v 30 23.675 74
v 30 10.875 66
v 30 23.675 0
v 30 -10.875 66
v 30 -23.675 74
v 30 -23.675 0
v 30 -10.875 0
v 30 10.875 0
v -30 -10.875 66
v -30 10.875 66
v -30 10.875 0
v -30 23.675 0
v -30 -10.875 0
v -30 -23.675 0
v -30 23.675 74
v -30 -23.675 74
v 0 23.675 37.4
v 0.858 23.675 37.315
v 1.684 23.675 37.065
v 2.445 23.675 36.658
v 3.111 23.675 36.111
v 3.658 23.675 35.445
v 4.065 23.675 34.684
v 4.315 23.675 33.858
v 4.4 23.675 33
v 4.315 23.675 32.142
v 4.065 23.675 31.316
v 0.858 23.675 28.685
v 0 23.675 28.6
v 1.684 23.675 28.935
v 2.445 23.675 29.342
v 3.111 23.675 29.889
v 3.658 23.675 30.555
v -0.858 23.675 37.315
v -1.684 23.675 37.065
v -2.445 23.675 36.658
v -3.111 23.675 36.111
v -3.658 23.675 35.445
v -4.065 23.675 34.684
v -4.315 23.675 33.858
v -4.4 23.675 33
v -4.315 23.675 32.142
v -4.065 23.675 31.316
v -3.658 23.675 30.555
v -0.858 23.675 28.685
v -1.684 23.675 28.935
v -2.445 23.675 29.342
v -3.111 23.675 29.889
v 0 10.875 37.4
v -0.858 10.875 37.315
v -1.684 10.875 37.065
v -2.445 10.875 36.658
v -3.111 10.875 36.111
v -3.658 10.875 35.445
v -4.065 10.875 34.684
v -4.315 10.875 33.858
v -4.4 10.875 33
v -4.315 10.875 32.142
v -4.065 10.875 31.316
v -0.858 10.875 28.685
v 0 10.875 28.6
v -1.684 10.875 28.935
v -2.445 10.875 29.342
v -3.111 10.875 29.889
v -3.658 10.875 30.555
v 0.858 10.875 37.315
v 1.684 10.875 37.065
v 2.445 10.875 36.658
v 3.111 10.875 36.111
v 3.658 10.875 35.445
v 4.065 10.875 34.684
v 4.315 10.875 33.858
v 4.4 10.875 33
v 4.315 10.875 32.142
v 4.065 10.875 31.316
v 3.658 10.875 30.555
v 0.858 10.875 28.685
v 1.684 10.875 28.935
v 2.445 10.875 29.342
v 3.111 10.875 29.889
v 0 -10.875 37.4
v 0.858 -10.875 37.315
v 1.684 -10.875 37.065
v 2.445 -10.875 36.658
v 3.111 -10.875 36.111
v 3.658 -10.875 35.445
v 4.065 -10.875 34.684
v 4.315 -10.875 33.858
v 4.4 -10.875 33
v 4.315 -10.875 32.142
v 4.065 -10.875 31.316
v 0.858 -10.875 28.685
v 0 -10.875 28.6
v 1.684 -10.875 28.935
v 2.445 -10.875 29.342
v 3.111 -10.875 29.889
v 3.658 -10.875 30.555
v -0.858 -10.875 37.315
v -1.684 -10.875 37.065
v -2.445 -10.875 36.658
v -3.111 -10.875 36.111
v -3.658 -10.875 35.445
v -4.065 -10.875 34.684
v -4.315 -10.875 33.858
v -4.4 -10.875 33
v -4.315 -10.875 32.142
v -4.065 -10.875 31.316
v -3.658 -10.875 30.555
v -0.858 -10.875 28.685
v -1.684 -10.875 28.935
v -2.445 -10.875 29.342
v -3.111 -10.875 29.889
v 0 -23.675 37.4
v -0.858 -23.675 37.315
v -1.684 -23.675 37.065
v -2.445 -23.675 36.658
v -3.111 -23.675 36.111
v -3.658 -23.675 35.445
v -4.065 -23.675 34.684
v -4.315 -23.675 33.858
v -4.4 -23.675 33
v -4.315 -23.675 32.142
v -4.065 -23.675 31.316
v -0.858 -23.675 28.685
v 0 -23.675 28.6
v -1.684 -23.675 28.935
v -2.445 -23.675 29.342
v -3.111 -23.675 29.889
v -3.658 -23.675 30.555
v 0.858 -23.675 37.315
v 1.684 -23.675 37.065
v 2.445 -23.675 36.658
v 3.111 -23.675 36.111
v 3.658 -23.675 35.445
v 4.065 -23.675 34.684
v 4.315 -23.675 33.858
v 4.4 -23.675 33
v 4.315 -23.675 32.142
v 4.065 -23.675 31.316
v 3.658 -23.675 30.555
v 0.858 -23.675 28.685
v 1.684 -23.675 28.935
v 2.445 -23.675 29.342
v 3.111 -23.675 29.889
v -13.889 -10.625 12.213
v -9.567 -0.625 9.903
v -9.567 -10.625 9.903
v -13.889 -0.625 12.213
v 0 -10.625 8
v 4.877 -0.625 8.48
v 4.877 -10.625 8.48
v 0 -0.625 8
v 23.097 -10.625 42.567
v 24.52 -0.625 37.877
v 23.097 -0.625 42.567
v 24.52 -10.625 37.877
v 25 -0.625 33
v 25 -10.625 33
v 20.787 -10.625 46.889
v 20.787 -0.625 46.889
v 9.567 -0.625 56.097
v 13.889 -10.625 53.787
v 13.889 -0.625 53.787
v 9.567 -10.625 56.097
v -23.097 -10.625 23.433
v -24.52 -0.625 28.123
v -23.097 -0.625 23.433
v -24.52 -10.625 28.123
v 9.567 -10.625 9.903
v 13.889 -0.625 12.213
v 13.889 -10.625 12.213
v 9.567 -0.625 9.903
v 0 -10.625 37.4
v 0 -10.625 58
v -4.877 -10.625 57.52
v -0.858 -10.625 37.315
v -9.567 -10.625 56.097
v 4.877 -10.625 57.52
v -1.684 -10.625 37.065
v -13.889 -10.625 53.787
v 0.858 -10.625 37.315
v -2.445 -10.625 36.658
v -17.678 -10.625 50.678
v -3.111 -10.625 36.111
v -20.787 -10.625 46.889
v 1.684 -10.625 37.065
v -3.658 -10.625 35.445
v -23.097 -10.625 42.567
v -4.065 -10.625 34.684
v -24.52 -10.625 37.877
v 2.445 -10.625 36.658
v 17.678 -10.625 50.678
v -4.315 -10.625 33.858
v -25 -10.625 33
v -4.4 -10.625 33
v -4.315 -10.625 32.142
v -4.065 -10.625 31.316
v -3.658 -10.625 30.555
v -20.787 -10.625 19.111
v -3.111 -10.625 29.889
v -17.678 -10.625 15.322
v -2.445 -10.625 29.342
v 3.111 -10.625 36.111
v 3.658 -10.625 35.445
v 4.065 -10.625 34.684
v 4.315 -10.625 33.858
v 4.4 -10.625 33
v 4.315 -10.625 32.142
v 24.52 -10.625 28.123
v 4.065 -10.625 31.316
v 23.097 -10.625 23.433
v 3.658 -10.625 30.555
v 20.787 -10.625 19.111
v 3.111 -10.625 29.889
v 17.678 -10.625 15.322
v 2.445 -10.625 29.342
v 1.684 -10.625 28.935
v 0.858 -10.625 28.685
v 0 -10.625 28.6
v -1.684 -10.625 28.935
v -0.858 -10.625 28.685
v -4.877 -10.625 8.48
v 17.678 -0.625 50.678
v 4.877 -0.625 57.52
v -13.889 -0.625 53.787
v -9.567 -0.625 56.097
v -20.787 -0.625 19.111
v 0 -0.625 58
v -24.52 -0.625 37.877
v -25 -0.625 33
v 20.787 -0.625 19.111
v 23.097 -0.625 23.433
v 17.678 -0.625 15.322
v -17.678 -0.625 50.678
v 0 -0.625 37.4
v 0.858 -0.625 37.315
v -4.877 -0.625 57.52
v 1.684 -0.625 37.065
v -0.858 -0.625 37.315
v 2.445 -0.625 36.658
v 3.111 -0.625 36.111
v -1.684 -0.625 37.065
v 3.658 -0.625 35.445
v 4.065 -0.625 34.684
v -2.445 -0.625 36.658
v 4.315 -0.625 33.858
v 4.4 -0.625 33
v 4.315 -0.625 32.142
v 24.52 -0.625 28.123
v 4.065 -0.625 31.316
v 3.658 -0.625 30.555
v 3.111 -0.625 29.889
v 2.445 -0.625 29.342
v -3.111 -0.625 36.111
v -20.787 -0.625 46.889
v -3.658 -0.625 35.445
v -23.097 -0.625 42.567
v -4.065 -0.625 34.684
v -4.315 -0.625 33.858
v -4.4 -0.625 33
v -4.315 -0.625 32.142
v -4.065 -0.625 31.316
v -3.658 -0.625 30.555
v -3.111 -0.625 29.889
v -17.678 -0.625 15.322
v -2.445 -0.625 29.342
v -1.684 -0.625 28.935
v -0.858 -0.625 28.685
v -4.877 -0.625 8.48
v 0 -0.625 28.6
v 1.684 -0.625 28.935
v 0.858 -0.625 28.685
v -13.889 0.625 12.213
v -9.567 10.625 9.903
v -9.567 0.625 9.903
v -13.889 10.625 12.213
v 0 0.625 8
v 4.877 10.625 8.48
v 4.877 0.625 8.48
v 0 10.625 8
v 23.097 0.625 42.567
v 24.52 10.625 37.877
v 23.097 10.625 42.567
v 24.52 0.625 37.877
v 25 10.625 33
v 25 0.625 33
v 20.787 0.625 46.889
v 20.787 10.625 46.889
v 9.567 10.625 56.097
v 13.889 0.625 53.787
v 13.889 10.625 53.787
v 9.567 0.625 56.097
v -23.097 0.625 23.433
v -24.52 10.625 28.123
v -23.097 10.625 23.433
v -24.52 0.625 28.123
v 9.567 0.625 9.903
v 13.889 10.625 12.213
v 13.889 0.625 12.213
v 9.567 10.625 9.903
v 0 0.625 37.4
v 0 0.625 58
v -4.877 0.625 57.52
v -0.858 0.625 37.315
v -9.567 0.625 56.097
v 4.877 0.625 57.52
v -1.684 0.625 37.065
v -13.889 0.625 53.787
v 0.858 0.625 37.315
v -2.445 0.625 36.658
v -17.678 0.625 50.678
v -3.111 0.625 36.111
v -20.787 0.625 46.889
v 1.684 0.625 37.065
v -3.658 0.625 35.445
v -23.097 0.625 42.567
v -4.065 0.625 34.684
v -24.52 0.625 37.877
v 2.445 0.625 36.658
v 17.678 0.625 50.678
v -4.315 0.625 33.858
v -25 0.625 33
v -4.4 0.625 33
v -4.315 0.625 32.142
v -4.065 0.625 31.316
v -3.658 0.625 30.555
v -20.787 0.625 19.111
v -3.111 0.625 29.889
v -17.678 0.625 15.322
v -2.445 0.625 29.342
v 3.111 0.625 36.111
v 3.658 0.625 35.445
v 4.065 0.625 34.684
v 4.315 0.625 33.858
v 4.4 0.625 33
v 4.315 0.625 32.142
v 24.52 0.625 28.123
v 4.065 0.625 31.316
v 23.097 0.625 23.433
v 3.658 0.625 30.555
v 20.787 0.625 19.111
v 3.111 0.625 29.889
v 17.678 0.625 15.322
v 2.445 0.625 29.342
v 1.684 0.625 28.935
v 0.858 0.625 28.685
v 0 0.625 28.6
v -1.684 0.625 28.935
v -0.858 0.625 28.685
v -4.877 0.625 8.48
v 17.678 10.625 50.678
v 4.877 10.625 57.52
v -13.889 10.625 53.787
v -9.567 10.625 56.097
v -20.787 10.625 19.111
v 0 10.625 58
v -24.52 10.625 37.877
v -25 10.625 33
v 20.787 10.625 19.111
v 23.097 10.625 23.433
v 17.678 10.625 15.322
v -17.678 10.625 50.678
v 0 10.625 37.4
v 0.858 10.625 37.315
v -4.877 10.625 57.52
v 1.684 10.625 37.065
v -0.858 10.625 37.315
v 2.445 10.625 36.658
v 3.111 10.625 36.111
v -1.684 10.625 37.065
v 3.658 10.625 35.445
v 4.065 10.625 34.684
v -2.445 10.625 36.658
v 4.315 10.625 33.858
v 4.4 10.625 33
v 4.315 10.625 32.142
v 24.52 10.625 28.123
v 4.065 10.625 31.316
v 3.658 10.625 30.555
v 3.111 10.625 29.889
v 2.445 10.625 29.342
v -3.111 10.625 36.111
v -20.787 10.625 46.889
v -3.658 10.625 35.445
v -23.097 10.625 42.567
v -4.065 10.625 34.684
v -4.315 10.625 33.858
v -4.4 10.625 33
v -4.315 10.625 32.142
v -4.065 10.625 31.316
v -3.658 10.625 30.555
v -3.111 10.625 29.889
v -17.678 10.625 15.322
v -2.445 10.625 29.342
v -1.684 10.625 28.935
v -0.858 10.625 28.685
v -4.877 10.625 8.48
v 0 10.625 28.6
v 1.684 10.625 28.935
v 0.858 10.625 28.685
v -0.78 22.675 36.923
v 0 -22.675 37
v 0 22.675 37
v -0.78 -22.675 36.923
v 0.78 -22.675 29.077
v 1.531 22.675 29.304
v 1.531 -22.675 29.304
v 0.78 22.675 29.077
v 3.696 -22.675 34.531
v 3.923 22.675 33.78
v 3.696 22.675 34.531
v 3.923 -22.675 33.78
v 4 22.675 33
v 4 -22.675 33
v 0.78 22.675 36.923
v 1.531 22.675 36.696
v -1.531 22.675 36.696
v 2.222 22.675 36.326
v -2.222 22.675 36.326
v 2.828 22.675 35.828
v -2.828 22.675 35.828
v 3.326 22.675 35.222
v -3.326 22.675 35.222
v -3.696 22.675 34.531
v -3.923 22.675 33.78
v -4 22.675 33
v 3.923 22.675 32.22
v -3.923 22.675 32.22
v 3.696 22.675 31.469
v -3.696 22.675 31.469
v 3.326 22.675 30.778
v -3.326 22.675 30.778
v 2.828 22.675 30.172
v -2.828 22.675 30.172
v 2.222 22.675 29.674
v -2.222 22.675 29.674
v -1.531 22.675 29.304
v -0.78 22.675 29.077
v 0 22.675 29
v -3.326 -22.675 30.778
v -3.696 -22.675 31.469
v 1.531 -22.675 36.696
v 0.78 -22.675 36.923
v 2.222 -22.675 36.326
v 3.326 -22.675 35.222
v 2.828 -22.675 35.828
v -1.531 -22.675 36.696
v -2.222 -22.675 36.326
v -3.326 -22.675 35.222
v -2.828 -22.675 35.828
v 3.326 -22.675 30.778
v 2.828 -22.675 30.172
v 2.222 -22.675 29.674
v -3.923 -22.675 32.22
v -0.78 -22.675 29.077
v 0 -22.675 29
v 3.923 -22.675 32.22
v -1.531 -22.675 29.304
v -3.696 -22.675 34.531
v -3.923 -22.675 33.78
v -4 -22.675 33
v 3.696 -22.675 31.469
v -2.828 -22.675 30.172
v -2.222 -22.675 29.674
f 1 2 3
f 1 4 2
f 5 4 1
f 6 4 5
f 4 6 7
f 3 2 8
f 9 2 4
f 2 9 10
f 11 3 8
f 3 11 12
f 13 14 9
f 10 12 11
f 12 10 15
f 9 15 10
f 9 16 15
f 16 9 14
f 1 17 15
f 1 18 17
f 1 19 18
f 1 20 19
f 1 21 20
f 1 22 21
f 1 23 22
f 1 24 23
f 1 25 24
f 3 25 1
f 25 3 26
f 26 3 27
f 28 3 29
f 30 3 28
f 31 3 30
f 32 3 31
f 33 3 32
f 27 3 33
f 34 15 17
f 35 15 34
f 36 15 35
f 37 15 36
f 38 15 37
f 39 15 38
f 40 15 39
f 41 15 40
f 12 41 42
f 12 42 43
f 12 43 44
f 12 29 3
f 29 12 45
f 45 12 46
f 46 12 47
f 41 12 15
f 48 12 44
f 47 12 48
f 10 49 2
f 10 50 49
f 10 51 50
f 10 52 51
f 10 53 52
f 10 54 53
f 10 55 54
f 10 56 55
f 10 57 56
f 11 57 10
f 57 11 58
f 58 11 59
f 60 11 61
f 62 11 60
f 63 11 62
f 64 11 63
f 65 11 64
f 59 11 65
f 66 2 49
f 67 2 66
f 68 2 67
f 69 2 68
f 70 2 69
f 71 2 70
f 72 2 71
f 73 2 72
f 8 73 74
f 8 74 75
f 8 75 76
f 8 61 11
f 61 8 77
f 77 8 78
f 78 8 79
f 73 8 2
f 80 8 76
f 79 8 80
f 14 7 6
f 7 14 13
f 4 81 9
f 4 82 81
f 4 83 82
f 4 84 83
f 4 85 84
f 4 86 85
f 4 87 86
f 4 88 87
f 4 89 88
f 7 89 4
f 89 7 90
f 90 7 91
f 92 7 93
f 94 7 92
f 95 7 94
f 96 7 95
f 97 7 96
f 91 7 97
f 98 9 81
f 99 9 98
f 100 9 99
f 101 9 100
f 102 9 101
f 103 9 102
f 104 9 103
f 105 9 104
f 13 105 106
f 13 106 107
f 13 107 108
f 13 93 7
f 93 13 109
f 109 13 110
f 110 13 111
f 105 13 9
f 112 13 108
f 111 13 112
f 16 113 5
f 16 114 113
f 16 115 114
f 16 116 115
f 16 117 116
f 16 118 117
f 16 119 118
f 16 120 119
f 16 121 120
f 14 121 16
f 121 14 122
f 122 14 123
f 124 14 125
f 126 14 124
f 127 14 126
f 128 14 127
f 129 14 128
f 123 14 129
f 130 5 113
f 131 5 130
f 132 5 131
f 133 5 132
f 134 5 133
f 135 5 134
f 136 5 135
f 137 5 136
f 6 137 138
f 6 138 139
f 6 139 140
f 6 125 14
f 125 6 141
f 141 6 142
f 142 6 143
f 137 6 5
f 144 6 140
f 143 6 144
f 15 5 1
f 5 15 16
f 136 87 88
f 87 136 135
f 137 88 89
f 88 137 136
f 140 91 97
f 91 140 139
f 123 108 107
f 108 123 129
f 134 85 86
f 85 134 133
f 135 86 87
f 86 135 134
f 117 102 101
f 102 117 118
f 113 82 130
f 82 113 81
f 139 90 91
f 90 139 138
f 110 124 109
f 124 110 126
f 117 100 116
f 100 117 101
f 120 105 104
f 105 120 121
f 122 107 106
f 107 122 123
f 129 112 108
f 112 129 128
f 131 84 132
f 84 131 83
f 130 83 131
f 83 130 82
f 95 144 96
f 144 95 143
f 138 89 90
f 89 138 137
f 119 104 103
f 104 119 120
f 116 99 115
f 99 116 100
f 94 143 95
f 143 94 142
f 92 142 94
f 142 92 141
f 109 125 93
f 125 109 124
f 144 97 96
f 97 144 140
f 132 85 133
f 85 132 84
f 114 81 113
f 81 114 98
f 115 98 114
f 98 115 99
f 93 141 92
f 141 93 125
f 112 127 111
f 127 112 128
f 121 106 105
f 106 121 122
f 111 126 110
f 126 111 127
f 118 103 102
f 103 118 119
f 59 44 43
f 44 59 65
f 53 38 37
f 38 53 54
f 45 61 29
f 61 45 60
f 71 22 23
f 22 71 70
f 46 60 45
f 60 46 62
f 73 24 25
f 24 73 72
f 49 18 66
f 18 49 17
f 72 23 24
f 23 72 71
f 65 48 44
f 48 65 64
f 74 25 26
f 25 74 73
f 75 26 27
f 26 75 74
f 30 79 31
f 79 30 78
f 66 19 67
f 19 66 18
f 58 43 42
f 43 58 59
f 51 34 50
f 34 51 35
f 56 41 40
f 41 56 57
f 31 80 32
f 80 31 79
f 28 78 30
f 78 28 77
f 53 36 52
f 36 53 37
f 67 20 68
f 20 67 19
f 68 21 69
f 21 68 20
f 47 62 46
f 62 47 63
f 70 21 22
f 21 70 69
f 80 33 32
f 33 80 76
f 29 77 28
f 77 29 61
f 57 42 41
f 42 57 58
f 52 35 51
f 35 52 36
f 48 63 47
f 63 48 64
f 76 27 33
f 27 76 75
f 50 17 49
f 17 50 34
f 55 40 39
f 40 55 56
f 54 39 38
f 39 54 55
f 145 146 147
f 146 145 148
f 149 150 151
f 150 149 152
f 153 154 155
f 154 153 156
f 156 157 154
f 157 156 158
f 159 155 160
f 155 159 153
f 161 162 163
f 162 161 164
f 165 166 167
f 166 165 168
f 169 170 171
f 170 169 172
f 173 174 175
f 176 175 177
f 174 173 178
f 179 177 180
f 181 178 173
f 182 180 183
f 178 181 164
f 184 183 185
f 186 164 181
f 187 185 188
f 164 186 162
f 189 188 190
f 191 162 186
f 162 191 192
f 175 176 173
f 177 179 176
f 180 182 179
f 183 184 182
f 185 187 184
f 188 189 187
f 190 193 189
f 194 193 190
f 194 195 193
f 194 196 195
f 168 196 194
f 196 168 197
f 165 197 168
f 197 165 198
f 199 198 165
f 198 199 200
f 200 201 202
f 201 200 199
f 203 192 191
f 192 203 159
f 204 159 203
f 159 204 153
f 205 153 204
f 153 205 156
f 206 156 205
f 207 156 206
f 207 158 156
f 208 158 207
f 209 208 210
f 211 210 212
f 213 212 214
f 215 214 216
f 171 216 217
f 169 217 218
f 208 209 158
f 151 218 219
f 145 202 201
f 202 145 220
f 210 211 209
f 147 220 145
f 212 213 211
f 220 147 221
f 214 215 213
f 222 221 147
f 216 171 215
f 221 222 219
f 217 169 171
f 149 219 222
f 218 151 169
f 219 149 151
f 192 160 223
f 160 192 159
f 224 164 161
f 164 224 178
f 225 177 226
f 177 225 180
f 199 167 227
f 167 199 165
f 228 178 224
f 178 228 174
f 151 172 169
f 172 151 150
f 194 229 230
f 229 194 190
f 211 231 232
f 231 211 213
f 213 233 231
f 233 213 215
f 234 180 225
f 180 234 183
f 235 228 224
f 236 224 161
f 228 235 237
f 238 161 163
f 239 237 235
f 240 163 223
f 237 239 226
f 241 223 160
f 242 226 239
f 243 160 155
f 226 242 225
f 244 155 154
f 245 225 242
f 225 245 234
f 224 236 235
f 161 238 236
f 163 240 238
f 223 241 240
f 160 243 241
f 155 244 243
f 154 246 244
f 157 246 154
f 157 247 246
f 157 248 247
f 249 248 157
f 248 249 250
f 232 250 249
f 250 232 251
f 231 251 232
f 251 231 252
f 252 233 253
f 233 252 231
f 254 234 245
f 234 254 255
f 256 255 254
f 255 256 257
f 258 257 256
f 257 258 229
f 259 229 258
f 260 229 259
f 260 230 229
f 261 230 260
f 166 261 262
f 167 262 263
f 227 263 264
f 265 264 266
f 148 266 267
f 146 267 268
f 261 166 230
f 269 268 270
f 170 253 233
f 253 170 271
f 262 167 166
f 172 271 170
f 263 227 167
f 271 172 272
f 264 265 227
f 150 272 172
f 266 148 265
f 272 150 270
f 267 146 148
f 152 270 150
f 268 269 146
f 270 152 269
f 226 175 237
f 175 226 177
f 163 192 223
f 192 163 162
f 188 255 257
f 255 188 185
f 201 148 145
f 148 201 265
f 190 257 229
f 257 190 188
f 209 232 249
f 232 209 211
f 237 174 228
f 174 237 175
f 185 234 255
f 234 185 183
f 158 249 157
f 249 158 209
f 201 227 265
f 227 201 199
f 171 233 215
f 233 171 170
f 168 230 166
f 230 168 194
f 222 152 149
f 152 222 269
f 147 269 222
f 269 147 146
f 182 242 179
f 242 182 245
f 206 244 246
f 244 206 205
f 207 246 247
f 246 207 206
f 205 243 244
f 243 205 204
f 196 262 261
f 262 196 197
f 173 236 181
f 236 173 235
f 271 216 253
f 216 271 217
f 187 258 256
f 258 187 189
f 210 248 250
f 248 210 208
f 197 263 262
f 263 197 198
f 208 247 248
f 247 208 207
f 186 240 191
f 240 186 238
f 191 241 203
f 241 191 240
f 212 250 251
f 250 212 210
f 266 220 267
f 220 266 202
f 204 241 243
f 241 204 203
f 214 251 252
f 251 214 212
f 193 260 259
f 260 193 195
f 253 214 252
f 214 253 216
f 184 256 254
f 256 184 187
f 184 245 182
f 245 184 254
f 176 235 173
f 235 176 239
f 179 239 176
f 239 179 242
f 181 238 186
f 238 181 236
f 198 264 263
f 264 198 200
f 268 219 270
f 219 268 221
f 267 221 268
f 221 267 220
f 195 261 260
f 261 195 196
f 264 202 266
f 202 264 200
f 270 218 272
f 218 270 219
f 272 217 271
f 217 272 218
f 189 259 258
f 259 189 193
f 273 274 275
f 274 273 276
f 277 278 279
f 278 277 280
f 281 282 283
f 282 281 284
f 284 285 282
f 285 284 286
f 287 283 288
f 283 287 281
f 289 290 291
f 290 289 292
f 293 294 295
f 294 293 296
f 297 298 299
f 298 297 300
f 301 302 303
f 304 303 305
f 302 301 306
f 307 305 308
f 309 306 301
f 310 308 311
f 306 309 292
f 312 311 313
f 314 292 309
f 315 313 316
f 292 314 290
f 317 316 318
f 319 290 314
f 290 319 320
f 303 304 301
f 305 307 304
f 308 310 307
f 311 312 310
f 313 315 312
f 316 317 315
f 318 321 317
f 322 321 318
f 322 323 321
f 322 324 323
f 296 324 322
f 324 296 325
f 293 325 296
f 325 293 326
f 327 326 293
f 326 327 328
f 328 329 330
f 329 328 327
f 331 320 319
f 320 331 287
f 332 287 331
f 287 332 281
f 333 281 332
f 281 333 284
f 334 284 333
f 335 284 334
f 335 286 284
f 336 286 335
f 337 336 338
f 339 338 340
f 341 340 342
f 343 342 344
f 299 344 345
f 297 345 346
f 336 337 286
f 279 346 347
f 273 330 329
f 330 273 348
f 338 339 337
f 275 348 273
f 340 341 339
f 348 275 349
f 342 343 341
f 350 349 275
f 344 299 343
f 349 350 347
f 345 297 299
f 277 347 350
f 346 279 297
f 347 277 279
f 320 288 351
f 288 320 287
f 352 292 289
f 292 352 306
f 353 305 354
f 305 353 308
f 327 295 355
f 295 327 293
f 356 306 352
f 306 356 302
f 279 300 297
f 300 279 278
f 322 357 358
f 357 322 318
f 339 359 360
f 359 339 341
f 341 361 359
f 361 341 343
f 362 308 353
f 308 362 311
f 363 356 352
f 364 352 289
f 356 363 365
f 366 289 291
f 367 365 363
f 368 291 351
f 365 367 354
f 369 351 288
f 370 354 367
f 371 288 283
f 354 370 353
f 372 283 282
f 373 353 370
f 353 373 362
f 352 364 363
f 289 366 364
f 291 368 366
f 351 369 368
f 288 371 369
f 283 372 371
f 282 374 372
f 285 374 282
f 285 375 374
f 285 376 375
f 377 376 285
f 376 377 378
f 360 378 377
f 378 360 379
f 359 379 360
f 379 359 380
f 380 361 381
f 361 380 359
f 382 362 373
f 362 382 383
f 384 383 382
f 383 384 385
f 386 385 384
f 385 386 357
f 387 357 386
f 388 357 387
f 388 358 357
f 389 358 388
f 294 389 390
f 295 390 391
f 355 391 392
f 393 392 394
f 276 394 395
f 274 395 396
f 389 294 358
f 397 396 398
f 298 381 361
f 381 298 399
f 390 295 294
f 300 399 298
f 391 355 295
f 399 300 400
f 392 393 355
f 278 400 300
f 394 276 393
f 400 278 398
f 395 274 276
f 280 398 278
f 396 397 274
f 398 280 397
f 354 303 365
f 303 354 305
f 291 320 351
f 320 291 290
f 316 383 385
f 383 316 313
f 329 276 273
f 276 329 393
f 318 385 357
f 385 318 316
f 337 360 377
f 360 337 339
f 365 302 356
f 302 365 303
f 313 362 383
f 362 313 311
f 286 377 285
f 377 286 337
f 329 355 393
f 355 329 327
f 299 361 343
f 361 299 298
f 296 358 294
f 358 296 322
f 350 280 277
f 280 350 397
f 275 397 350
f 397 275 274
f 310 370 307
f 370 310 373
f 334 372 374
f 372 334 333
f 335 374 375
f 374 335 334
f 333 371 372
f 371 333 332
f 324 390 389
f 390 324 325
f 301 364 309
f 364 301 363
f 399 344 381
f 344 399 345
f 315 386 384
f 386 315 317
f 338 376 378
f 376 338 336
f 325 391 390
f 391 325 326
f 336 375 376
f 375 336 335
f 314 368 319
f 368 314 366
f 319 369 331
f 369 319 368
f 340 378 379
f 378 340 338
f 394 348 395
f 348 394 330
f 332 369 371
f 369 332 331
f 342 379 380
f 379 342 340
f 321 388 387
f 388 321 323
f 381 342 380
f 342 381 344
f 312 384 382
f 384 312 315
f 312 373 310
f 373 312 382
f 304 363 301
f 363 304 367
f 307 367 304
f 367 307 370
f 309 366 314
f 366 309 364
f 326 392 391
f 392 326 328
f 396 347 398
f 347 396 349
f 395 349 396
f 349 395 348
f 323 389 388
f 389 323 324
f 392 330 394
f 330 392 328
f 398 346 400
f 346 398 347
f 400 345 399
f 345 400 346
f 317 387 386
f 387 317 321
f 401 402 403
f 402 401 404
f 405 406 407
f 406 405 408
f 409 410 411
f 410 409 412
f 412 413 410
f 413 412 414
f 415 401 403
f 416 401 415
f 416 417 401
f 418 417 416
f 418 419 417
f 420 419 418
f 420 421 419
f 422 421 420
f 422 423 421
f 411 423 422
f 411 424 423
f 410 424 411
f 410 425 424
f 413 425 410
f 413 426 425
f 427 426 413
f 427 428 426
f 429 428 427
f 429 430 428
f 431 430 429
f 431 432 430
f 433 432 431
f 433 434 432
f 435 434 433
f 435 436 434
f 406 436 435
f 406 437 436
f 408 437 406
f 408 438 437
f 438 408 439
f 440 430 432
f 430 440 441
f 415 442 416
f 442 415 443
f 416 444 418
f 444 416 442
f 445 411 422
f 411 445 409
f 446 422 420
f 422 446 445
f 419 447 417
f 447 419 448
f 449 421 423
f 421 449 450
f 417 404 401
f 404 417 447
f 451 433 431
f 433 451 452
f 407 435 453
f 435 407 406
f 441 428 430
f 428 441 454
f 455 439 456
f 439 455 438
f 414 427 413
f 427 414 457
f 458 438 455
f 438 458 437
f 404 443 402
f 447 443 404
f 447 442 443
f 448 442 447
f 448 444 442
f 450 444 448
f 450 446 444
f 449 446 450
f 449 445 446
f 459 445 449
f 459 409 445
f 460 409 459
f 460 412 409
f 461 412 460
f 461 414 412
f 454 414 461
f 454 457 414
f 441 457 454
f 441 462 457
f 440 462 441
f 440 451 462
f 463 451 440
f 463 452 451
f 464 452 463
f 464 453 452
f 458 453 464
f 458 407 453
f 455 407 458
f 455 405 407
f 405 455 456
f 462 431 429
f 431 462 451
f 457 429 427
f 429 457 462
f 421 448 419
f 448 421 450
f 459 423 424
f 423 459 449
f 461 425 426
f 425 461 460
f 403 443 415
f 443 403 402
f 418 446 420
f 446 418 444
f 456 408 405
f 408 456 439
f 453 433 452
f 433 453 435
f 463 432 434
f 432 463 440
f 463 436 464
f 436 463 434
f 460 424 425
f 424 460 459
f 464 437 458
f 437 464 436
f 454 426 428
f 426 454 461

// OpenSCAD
$fn = 32;

// ------------------------------------------------------------------------
// Trolley wheel set: wheels d50, fork 66 mm tall
// Every part is its own module, assembly() places every instance.
// ------------------------------------------------------------------------

// --- part 1 ---
module trolley_fork() {
  difference() {
    union() {
      translate([-30, 10.875, 0]) cube([60, 12.8, 66]);
      translate([-30, -23.675, 0]) cube([60, 12.8, 66]);
      translate([-30, -23.675, 66]) cube([60, 47.35, 8]);
    }
    translate([0, -17.275, 33]) rotate([90, 0, 0]) cylinder(h = 14.8, d = 8.8, center = true);
    translate([0, 17.275, 33]) rotate([90, 0, 0]) cylinder(h = 14.8, d = 8.8, center = true);
  }
}

// --- part 2 ---
module trolley_wheel() {
  difference() {
      translate([0, 0, 0]) cylinder(h = 10, d = 50);
      translate([0, 0, -1]) cylinder(h = 12, d = 8.8);
    }
}

// --- part 3 ---
module trolley_axle() {
  translate([0, 0, -22.675]) cylinder(h = 45.35, d = 8);
}

// --- assembly ---
module assembly() {
  color([0.80, 0.24, 0.20]) translate([0, 0, 0]) rotate([0, 0, 0]) trolley_fork();
  color([0.20, 0.45, 0.75]) translate([0, -0.625, 33]) rotate([90, 0, 0]) trolley_wheel();
  color([0.25, 0.62, 0.32]) translate([0, 10.625, 33]) rotate([90, 0, 0]) trolley_wheel();
  color([0.92, 0.70, 0.18]) translate([0, 0, 33]) rotate([90, 0, 0]) trolley_axle();
}

assembly();
